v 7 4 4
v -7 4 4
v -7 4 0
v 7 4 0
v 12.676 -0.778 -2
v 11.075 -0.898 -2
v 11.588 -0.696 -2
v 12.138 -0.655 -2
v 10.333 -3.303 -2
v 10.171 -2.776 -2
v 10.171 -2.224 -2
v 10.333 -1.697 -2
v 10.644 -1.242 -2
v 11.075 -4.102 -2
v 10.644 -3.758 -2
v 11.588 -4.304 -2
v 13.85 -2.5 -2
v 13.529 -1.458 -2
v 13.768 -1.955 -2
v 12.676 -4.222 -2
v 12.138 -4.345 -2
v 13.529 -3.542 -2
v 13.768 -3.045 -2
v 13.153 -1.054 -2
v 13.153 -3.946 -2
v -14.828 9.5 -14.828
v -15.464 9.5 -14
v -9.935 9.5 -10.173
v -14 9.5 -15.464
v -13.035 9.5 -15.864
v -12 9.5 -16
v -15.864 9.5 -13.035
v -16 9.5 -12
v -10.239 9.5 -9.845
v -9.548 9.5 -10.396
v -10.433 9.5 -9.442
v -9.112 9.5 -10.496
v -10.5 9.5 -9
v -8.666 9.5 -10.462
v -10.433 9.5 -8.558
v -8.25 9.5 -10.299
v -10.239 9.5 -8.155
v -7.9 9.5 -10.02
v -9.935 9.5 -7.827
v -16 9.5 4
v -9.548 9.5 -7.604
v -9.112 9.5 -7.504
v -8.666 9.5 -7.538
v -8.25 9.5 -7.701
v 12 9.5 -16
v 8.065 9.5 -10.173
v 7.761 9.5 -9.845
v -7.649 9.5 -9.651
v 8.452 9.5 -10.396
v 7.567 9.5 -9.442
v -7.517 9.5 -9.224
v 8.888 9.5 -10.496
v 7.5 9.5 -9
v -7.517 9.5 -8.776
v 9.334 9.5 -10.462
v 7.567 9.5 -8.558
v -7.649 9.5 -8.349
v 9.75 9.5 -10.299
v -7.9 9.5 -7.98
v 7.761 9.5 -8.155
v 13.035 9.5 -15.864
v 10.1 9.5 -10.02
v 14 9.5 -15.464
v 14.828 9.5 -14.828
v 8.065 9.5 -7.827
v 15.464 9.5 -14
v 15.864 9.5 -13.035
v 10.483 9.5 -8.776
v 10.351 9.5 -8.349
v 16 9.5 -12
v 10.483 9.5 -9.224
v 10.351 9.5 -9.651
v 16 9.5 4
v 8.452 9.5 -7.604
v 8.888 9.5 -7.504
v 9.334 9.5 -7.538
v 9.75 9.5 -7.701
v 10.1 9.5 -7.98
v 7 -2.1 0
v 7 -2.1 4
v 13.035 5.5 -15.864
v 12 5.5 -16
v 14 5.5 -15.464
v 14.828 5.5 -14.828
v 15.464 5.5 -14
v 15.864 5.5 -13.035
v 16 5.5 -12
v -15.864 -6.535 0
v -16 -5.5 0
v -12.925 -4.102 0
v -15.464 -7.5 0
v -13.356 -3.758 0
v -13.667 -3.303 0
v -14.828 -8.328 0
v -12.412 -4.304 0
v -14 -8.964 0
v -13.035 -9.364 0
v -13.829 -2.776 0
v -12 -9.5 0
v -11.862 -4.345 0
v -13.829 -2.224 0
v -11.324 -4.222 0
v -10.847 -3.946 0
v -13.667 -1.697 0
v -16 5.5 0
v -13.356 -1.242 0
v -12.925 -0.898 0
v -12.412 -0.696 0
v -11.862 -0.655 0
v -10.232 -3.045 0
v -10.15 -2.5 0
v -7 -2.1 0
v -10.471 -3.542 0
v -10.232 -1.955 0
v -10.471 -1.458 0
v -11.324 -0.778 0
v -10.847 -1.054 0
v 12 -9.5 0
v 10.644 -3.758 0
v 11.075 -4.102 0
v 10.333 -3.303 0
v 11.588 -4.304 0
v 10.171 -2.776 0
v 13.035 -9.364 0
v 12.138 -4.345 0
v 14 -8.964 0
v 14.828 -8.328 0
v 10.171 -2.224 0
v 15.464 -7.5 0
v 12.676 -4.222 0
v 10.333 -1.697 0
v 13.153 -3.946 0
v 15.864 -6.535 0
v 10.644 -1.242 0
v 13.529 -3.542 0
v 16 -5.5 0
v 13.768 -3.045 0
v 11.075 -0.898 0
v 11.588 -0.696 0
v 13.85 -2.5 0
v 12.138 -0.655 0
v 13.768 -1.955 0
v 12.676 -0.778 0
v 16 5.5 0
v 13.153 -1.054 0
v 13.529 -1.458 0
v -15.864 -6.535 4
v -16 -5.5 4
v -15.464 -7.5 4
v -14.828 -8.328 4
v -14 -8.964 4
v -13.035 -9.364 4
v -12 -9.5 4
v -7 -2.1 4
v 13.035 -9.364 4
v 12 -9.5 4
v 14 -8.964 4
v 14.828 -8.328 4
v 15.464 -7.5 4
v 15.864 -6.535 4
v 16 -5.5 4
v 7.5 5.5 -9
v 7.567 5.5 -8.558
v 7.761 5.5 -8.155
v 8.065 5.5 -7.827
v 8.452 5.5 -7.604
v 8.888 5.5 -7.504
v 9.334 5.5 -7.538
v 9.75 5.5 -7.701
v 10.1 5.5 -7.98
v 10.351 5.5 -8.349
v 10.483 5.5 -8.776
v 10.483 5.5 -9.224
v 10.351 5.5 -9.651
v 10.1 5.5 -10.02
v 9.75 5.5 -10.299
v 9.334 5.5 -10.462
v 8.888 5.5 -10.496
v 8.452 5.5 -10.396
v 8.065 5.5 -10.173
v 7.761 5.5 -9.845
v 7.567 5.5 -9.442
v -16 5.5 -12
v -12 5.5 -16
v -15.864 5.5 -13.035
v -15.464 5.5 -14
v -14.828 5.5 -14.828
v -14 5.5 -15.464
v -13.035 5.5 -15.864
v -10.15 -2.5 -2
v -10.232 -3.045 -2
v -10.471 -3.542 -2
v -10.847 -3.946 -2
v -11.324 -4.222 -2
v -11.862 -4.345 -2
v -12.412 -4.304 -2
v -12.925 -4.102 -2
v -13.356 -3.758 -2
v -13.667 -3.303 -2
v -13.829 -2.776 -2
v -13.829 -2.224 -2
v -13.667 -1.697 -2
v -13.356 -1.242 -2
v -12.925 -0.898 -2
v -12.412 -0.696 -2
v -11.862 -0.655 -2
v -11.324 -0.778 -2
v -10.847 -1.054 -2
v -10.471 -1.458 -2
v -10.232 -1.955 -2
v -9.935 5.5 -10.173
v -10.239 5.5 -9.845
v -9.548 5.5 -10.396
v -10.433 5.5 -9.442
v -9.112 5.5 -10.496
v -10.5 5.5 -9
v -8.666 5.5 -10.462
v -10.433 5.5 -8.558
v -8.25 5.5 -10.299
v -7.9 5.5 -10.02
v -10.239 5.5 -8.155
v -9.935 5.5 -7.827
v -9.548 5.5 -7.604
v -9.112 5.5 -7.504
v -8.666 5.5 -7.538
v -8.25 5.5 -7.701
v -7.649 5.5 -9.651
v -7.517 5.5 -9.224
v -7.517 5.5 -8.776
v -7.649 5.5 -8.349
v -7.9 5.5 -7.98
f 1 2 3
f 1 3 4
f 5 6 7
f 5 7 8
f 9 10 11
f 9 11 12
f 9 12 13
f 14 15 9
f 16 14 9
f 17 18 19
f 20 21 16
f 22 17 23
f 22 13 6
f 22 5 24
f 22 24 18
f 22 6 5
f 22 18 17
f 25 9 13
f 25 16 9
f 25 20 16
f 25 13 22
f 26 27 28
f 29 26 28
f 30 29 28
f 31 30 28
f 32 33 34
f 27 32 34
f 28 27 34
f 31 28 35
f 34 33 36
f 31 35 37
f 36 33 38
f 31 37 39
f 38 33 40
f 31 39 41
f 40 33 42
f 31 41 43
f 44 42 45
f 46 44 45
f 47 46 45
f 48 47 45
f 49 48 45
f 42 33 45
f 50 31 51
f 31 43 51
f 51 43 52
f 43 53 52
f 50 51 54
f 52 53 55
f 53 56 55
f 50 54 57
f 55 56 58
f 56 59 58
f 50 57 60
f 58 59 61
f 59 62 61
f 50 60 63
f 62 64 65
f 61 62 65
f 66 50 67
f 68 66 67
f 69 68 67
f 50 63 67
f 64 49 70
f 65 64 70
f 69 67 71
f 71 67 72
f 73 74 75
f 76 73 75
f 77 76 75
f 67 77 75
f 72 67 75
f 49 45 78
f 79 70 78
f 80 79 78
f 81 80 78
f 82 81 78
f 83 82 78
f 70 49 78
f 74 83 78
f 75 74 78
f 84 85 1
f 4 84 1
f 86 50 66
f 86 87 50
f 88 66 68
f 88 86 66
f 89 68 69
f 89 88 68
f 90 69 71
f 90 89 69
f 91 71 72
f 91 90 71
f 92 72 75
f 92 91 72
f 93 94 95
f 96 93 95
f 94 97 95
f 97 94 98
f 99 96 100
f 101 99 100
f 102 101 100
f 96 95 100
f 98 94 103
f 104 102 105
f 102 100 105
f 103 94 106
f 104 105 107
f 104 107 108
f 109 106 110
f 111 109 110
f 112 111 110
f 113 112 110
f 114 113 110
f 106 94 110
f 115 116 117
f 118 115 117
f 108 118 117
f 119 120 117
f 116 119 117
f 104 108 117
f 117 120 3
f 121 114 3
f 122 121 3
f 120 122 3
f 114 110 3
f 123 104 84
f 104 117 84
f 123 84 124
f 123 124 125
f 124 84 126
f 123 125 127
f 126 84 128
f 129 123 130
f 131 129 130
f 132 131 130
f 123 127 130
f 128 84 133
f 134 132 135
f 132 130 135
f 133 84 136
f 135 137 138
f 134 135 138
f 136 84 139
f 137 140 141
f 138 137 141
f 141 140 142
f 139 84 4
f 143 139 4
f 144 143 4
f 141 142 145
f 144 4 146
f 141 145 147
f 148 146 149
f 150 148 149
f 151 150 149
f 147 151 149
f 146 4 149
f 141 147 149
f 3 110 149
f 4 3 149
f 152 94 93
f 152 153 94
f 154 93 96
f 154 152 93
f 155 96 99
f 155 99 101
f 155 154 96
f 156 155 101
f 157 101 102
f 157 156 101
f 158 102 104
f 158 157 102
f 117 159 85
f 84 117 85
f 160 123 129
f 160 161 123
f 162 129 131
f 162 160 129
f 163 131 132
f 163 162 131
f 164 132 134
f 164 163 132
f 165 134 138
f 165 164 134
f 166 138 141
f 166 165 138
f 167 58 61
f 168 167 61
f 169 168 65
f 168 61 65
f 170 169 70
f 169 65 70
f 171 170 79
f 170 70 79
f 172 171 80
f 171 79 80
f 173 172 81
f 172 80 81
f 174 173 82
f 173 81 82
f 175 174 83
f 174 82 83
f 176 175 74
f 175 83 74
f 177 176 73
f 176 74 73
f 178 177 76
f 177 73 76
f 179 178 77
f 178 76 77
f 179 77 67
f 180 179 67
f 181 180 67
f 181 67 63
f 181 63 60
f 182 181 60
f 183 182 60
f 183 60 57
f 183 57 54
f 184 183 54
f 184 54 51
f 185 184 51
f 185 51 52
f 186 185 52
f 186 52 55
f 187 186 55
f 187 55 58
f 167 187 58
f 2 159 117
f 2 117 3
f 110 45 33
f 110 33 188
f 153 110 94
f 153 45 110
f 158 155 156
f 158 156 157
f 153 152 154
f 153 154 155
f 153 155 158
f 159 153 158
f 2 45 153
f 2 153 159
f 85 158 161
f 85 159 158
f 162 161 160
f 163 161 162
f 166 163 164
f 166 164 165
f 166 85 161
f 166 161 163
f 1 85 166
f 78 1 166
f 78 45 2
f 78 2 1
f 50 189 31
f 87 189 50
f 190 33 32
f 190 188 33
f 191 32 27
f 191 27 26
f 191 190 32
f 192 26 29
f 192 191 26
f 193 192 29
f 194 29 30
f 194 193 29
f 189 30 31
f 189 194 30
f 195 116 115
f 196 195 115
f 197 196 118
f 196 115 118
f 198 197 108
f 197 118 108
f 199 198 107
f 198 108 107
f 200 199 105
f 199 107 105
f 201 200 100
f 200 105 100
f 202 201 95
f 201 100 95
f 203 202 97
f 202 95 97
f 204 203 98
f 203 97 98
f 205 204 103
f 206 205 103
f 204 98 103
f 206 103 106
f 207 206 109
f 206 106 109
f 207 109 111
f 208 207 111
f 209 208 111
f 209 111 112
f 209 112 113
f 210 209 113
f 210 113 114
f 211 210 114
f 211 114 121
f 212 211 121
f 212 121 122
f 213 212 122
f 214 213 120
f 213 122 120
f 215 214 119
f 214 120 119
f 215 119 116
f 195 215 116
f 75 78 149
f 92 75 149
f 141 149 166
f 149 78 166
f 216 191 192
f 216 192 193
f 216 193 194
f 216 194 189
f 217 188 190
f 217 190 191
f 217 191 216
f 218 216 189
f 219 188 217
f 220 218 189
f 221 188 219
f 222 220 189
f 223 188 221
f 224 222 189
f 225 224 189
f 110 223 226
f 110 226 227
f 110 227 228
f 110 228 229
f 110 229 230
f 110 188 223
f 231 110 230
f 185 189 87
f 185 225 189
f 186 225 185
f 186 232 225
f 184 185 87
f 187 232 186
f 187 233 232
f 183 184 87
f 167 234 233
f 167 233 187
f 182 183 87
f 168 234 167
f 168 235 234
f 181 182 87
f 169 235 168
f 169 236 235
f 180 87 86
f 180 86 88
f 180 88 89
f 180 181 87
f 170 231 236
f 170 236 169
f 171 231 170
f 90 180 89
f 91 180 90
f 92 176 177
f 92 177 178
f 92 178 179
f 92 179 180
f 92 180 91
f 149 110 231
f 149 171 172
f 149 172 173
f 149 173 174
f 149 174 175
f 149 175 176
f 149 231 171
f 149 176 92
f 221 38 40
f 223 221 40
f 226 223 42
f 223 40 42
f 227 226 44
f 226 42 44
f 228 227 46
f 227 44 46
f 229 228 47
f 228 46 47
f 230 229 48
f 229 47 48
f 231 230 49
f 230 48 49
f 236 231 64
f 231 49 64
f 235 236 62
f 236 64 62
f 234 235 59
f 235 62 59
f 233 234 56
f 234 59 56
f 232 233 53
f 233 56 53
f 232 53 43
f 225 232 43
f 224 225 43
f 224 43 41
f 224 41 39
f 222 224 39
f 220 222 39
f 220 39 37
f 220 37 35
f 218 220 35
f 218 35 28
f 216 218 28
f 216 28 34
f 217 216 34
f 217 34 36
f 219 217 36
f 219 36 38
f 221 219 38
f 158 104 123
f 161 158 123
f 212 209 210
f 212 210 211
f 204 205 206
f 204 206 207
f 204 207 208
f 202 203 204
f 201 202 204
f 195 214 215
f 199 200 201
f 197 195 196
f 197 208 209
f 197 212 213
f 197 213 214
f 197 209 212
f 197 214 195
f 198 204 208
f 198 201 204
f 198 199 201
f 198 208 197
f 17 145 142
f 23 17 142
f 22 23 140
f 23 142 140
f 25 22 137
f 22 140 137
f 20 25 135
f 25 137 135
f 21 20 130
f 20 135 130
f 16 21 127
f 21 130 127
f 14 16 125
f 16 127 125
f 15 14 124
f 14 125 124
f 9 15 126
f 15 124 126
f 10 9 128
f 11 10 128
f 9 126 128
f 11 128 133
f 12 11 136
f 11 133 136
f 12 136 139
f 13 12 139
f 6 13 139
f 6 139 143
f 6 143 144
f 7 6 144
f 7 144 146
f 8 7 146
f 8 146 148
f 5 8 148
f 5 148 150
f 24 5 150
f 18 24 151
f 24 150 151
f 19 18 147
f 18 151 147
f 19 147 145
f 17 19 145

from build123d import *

# Parameters (mm, degrees)
F0_W     = 32
F0_H     = 19
F1_DEPTH = 4
F2_W     = 32
F2_H     = 4
F3_DEPTH = 16
F5_W     = 14
F5_H     = 6.1
F6_DEPTH = 25
F7_R     = 1.85
F8_DEPTH = 2
F9_D     = 3
F10_R    = 4


with BuildPart() as f1:
    # F0 (on Top) → F1 (new body)
    with BuildSketch(Plane.XY):
        Rectangle(F0_W, F0_H)
    extrude(amount=F1_DEPTH)

    # F2 (on face) → F3 (join)
    with BuildSketch(Plane(origin=(0, 0, 0), x_dir=(1, 0, 0), z_dir=(0, 0, -1))):
        with Locations((0, -7.5)):
            Rectangle(F2_W, F2_H)
    extrude(amount=F3_DEPTH)

    # F5 (on face) → F6 (cut)
    with BuildSketch(Plane.XY.offset(4)):
        with Locations((0, 0.95)):
            Rectangle(F5_W, F5_H)
    extrude(amount=-F6_DEPTH, mode=Mode.SUBTRACT)

    # F7 (on face) → F8 (join)
    with BuildSketch(Plane(origin=(0, 0, 0), x_dir=(1, 0, 0), z_dir=(0, 0, -1))):
        with Locations((-12, 2.5)):
            Circle(F7_R)
        with Locations((12, 2.5)):
            Circle(F7_R)
    extrude(amount=F8_DEPTH)

    # F9 (through all)
    with Locations(Plane.XZ.offset(-5.5)):
        with Locations((-9, -9), (9, -9)):
            Hole(F9_D / 2)

    # F10
    f10_edges = [f1.edges().sort_by_distance(p)[0] for p in [
        (16, -9.5, 2),
        (-16, -9.5, 2),
        (-16, 7.5, -16),
        (16, 7.5, -16),
    ]]
    fillet(f10_edges, radius=F10_R)


solid = f1.part
